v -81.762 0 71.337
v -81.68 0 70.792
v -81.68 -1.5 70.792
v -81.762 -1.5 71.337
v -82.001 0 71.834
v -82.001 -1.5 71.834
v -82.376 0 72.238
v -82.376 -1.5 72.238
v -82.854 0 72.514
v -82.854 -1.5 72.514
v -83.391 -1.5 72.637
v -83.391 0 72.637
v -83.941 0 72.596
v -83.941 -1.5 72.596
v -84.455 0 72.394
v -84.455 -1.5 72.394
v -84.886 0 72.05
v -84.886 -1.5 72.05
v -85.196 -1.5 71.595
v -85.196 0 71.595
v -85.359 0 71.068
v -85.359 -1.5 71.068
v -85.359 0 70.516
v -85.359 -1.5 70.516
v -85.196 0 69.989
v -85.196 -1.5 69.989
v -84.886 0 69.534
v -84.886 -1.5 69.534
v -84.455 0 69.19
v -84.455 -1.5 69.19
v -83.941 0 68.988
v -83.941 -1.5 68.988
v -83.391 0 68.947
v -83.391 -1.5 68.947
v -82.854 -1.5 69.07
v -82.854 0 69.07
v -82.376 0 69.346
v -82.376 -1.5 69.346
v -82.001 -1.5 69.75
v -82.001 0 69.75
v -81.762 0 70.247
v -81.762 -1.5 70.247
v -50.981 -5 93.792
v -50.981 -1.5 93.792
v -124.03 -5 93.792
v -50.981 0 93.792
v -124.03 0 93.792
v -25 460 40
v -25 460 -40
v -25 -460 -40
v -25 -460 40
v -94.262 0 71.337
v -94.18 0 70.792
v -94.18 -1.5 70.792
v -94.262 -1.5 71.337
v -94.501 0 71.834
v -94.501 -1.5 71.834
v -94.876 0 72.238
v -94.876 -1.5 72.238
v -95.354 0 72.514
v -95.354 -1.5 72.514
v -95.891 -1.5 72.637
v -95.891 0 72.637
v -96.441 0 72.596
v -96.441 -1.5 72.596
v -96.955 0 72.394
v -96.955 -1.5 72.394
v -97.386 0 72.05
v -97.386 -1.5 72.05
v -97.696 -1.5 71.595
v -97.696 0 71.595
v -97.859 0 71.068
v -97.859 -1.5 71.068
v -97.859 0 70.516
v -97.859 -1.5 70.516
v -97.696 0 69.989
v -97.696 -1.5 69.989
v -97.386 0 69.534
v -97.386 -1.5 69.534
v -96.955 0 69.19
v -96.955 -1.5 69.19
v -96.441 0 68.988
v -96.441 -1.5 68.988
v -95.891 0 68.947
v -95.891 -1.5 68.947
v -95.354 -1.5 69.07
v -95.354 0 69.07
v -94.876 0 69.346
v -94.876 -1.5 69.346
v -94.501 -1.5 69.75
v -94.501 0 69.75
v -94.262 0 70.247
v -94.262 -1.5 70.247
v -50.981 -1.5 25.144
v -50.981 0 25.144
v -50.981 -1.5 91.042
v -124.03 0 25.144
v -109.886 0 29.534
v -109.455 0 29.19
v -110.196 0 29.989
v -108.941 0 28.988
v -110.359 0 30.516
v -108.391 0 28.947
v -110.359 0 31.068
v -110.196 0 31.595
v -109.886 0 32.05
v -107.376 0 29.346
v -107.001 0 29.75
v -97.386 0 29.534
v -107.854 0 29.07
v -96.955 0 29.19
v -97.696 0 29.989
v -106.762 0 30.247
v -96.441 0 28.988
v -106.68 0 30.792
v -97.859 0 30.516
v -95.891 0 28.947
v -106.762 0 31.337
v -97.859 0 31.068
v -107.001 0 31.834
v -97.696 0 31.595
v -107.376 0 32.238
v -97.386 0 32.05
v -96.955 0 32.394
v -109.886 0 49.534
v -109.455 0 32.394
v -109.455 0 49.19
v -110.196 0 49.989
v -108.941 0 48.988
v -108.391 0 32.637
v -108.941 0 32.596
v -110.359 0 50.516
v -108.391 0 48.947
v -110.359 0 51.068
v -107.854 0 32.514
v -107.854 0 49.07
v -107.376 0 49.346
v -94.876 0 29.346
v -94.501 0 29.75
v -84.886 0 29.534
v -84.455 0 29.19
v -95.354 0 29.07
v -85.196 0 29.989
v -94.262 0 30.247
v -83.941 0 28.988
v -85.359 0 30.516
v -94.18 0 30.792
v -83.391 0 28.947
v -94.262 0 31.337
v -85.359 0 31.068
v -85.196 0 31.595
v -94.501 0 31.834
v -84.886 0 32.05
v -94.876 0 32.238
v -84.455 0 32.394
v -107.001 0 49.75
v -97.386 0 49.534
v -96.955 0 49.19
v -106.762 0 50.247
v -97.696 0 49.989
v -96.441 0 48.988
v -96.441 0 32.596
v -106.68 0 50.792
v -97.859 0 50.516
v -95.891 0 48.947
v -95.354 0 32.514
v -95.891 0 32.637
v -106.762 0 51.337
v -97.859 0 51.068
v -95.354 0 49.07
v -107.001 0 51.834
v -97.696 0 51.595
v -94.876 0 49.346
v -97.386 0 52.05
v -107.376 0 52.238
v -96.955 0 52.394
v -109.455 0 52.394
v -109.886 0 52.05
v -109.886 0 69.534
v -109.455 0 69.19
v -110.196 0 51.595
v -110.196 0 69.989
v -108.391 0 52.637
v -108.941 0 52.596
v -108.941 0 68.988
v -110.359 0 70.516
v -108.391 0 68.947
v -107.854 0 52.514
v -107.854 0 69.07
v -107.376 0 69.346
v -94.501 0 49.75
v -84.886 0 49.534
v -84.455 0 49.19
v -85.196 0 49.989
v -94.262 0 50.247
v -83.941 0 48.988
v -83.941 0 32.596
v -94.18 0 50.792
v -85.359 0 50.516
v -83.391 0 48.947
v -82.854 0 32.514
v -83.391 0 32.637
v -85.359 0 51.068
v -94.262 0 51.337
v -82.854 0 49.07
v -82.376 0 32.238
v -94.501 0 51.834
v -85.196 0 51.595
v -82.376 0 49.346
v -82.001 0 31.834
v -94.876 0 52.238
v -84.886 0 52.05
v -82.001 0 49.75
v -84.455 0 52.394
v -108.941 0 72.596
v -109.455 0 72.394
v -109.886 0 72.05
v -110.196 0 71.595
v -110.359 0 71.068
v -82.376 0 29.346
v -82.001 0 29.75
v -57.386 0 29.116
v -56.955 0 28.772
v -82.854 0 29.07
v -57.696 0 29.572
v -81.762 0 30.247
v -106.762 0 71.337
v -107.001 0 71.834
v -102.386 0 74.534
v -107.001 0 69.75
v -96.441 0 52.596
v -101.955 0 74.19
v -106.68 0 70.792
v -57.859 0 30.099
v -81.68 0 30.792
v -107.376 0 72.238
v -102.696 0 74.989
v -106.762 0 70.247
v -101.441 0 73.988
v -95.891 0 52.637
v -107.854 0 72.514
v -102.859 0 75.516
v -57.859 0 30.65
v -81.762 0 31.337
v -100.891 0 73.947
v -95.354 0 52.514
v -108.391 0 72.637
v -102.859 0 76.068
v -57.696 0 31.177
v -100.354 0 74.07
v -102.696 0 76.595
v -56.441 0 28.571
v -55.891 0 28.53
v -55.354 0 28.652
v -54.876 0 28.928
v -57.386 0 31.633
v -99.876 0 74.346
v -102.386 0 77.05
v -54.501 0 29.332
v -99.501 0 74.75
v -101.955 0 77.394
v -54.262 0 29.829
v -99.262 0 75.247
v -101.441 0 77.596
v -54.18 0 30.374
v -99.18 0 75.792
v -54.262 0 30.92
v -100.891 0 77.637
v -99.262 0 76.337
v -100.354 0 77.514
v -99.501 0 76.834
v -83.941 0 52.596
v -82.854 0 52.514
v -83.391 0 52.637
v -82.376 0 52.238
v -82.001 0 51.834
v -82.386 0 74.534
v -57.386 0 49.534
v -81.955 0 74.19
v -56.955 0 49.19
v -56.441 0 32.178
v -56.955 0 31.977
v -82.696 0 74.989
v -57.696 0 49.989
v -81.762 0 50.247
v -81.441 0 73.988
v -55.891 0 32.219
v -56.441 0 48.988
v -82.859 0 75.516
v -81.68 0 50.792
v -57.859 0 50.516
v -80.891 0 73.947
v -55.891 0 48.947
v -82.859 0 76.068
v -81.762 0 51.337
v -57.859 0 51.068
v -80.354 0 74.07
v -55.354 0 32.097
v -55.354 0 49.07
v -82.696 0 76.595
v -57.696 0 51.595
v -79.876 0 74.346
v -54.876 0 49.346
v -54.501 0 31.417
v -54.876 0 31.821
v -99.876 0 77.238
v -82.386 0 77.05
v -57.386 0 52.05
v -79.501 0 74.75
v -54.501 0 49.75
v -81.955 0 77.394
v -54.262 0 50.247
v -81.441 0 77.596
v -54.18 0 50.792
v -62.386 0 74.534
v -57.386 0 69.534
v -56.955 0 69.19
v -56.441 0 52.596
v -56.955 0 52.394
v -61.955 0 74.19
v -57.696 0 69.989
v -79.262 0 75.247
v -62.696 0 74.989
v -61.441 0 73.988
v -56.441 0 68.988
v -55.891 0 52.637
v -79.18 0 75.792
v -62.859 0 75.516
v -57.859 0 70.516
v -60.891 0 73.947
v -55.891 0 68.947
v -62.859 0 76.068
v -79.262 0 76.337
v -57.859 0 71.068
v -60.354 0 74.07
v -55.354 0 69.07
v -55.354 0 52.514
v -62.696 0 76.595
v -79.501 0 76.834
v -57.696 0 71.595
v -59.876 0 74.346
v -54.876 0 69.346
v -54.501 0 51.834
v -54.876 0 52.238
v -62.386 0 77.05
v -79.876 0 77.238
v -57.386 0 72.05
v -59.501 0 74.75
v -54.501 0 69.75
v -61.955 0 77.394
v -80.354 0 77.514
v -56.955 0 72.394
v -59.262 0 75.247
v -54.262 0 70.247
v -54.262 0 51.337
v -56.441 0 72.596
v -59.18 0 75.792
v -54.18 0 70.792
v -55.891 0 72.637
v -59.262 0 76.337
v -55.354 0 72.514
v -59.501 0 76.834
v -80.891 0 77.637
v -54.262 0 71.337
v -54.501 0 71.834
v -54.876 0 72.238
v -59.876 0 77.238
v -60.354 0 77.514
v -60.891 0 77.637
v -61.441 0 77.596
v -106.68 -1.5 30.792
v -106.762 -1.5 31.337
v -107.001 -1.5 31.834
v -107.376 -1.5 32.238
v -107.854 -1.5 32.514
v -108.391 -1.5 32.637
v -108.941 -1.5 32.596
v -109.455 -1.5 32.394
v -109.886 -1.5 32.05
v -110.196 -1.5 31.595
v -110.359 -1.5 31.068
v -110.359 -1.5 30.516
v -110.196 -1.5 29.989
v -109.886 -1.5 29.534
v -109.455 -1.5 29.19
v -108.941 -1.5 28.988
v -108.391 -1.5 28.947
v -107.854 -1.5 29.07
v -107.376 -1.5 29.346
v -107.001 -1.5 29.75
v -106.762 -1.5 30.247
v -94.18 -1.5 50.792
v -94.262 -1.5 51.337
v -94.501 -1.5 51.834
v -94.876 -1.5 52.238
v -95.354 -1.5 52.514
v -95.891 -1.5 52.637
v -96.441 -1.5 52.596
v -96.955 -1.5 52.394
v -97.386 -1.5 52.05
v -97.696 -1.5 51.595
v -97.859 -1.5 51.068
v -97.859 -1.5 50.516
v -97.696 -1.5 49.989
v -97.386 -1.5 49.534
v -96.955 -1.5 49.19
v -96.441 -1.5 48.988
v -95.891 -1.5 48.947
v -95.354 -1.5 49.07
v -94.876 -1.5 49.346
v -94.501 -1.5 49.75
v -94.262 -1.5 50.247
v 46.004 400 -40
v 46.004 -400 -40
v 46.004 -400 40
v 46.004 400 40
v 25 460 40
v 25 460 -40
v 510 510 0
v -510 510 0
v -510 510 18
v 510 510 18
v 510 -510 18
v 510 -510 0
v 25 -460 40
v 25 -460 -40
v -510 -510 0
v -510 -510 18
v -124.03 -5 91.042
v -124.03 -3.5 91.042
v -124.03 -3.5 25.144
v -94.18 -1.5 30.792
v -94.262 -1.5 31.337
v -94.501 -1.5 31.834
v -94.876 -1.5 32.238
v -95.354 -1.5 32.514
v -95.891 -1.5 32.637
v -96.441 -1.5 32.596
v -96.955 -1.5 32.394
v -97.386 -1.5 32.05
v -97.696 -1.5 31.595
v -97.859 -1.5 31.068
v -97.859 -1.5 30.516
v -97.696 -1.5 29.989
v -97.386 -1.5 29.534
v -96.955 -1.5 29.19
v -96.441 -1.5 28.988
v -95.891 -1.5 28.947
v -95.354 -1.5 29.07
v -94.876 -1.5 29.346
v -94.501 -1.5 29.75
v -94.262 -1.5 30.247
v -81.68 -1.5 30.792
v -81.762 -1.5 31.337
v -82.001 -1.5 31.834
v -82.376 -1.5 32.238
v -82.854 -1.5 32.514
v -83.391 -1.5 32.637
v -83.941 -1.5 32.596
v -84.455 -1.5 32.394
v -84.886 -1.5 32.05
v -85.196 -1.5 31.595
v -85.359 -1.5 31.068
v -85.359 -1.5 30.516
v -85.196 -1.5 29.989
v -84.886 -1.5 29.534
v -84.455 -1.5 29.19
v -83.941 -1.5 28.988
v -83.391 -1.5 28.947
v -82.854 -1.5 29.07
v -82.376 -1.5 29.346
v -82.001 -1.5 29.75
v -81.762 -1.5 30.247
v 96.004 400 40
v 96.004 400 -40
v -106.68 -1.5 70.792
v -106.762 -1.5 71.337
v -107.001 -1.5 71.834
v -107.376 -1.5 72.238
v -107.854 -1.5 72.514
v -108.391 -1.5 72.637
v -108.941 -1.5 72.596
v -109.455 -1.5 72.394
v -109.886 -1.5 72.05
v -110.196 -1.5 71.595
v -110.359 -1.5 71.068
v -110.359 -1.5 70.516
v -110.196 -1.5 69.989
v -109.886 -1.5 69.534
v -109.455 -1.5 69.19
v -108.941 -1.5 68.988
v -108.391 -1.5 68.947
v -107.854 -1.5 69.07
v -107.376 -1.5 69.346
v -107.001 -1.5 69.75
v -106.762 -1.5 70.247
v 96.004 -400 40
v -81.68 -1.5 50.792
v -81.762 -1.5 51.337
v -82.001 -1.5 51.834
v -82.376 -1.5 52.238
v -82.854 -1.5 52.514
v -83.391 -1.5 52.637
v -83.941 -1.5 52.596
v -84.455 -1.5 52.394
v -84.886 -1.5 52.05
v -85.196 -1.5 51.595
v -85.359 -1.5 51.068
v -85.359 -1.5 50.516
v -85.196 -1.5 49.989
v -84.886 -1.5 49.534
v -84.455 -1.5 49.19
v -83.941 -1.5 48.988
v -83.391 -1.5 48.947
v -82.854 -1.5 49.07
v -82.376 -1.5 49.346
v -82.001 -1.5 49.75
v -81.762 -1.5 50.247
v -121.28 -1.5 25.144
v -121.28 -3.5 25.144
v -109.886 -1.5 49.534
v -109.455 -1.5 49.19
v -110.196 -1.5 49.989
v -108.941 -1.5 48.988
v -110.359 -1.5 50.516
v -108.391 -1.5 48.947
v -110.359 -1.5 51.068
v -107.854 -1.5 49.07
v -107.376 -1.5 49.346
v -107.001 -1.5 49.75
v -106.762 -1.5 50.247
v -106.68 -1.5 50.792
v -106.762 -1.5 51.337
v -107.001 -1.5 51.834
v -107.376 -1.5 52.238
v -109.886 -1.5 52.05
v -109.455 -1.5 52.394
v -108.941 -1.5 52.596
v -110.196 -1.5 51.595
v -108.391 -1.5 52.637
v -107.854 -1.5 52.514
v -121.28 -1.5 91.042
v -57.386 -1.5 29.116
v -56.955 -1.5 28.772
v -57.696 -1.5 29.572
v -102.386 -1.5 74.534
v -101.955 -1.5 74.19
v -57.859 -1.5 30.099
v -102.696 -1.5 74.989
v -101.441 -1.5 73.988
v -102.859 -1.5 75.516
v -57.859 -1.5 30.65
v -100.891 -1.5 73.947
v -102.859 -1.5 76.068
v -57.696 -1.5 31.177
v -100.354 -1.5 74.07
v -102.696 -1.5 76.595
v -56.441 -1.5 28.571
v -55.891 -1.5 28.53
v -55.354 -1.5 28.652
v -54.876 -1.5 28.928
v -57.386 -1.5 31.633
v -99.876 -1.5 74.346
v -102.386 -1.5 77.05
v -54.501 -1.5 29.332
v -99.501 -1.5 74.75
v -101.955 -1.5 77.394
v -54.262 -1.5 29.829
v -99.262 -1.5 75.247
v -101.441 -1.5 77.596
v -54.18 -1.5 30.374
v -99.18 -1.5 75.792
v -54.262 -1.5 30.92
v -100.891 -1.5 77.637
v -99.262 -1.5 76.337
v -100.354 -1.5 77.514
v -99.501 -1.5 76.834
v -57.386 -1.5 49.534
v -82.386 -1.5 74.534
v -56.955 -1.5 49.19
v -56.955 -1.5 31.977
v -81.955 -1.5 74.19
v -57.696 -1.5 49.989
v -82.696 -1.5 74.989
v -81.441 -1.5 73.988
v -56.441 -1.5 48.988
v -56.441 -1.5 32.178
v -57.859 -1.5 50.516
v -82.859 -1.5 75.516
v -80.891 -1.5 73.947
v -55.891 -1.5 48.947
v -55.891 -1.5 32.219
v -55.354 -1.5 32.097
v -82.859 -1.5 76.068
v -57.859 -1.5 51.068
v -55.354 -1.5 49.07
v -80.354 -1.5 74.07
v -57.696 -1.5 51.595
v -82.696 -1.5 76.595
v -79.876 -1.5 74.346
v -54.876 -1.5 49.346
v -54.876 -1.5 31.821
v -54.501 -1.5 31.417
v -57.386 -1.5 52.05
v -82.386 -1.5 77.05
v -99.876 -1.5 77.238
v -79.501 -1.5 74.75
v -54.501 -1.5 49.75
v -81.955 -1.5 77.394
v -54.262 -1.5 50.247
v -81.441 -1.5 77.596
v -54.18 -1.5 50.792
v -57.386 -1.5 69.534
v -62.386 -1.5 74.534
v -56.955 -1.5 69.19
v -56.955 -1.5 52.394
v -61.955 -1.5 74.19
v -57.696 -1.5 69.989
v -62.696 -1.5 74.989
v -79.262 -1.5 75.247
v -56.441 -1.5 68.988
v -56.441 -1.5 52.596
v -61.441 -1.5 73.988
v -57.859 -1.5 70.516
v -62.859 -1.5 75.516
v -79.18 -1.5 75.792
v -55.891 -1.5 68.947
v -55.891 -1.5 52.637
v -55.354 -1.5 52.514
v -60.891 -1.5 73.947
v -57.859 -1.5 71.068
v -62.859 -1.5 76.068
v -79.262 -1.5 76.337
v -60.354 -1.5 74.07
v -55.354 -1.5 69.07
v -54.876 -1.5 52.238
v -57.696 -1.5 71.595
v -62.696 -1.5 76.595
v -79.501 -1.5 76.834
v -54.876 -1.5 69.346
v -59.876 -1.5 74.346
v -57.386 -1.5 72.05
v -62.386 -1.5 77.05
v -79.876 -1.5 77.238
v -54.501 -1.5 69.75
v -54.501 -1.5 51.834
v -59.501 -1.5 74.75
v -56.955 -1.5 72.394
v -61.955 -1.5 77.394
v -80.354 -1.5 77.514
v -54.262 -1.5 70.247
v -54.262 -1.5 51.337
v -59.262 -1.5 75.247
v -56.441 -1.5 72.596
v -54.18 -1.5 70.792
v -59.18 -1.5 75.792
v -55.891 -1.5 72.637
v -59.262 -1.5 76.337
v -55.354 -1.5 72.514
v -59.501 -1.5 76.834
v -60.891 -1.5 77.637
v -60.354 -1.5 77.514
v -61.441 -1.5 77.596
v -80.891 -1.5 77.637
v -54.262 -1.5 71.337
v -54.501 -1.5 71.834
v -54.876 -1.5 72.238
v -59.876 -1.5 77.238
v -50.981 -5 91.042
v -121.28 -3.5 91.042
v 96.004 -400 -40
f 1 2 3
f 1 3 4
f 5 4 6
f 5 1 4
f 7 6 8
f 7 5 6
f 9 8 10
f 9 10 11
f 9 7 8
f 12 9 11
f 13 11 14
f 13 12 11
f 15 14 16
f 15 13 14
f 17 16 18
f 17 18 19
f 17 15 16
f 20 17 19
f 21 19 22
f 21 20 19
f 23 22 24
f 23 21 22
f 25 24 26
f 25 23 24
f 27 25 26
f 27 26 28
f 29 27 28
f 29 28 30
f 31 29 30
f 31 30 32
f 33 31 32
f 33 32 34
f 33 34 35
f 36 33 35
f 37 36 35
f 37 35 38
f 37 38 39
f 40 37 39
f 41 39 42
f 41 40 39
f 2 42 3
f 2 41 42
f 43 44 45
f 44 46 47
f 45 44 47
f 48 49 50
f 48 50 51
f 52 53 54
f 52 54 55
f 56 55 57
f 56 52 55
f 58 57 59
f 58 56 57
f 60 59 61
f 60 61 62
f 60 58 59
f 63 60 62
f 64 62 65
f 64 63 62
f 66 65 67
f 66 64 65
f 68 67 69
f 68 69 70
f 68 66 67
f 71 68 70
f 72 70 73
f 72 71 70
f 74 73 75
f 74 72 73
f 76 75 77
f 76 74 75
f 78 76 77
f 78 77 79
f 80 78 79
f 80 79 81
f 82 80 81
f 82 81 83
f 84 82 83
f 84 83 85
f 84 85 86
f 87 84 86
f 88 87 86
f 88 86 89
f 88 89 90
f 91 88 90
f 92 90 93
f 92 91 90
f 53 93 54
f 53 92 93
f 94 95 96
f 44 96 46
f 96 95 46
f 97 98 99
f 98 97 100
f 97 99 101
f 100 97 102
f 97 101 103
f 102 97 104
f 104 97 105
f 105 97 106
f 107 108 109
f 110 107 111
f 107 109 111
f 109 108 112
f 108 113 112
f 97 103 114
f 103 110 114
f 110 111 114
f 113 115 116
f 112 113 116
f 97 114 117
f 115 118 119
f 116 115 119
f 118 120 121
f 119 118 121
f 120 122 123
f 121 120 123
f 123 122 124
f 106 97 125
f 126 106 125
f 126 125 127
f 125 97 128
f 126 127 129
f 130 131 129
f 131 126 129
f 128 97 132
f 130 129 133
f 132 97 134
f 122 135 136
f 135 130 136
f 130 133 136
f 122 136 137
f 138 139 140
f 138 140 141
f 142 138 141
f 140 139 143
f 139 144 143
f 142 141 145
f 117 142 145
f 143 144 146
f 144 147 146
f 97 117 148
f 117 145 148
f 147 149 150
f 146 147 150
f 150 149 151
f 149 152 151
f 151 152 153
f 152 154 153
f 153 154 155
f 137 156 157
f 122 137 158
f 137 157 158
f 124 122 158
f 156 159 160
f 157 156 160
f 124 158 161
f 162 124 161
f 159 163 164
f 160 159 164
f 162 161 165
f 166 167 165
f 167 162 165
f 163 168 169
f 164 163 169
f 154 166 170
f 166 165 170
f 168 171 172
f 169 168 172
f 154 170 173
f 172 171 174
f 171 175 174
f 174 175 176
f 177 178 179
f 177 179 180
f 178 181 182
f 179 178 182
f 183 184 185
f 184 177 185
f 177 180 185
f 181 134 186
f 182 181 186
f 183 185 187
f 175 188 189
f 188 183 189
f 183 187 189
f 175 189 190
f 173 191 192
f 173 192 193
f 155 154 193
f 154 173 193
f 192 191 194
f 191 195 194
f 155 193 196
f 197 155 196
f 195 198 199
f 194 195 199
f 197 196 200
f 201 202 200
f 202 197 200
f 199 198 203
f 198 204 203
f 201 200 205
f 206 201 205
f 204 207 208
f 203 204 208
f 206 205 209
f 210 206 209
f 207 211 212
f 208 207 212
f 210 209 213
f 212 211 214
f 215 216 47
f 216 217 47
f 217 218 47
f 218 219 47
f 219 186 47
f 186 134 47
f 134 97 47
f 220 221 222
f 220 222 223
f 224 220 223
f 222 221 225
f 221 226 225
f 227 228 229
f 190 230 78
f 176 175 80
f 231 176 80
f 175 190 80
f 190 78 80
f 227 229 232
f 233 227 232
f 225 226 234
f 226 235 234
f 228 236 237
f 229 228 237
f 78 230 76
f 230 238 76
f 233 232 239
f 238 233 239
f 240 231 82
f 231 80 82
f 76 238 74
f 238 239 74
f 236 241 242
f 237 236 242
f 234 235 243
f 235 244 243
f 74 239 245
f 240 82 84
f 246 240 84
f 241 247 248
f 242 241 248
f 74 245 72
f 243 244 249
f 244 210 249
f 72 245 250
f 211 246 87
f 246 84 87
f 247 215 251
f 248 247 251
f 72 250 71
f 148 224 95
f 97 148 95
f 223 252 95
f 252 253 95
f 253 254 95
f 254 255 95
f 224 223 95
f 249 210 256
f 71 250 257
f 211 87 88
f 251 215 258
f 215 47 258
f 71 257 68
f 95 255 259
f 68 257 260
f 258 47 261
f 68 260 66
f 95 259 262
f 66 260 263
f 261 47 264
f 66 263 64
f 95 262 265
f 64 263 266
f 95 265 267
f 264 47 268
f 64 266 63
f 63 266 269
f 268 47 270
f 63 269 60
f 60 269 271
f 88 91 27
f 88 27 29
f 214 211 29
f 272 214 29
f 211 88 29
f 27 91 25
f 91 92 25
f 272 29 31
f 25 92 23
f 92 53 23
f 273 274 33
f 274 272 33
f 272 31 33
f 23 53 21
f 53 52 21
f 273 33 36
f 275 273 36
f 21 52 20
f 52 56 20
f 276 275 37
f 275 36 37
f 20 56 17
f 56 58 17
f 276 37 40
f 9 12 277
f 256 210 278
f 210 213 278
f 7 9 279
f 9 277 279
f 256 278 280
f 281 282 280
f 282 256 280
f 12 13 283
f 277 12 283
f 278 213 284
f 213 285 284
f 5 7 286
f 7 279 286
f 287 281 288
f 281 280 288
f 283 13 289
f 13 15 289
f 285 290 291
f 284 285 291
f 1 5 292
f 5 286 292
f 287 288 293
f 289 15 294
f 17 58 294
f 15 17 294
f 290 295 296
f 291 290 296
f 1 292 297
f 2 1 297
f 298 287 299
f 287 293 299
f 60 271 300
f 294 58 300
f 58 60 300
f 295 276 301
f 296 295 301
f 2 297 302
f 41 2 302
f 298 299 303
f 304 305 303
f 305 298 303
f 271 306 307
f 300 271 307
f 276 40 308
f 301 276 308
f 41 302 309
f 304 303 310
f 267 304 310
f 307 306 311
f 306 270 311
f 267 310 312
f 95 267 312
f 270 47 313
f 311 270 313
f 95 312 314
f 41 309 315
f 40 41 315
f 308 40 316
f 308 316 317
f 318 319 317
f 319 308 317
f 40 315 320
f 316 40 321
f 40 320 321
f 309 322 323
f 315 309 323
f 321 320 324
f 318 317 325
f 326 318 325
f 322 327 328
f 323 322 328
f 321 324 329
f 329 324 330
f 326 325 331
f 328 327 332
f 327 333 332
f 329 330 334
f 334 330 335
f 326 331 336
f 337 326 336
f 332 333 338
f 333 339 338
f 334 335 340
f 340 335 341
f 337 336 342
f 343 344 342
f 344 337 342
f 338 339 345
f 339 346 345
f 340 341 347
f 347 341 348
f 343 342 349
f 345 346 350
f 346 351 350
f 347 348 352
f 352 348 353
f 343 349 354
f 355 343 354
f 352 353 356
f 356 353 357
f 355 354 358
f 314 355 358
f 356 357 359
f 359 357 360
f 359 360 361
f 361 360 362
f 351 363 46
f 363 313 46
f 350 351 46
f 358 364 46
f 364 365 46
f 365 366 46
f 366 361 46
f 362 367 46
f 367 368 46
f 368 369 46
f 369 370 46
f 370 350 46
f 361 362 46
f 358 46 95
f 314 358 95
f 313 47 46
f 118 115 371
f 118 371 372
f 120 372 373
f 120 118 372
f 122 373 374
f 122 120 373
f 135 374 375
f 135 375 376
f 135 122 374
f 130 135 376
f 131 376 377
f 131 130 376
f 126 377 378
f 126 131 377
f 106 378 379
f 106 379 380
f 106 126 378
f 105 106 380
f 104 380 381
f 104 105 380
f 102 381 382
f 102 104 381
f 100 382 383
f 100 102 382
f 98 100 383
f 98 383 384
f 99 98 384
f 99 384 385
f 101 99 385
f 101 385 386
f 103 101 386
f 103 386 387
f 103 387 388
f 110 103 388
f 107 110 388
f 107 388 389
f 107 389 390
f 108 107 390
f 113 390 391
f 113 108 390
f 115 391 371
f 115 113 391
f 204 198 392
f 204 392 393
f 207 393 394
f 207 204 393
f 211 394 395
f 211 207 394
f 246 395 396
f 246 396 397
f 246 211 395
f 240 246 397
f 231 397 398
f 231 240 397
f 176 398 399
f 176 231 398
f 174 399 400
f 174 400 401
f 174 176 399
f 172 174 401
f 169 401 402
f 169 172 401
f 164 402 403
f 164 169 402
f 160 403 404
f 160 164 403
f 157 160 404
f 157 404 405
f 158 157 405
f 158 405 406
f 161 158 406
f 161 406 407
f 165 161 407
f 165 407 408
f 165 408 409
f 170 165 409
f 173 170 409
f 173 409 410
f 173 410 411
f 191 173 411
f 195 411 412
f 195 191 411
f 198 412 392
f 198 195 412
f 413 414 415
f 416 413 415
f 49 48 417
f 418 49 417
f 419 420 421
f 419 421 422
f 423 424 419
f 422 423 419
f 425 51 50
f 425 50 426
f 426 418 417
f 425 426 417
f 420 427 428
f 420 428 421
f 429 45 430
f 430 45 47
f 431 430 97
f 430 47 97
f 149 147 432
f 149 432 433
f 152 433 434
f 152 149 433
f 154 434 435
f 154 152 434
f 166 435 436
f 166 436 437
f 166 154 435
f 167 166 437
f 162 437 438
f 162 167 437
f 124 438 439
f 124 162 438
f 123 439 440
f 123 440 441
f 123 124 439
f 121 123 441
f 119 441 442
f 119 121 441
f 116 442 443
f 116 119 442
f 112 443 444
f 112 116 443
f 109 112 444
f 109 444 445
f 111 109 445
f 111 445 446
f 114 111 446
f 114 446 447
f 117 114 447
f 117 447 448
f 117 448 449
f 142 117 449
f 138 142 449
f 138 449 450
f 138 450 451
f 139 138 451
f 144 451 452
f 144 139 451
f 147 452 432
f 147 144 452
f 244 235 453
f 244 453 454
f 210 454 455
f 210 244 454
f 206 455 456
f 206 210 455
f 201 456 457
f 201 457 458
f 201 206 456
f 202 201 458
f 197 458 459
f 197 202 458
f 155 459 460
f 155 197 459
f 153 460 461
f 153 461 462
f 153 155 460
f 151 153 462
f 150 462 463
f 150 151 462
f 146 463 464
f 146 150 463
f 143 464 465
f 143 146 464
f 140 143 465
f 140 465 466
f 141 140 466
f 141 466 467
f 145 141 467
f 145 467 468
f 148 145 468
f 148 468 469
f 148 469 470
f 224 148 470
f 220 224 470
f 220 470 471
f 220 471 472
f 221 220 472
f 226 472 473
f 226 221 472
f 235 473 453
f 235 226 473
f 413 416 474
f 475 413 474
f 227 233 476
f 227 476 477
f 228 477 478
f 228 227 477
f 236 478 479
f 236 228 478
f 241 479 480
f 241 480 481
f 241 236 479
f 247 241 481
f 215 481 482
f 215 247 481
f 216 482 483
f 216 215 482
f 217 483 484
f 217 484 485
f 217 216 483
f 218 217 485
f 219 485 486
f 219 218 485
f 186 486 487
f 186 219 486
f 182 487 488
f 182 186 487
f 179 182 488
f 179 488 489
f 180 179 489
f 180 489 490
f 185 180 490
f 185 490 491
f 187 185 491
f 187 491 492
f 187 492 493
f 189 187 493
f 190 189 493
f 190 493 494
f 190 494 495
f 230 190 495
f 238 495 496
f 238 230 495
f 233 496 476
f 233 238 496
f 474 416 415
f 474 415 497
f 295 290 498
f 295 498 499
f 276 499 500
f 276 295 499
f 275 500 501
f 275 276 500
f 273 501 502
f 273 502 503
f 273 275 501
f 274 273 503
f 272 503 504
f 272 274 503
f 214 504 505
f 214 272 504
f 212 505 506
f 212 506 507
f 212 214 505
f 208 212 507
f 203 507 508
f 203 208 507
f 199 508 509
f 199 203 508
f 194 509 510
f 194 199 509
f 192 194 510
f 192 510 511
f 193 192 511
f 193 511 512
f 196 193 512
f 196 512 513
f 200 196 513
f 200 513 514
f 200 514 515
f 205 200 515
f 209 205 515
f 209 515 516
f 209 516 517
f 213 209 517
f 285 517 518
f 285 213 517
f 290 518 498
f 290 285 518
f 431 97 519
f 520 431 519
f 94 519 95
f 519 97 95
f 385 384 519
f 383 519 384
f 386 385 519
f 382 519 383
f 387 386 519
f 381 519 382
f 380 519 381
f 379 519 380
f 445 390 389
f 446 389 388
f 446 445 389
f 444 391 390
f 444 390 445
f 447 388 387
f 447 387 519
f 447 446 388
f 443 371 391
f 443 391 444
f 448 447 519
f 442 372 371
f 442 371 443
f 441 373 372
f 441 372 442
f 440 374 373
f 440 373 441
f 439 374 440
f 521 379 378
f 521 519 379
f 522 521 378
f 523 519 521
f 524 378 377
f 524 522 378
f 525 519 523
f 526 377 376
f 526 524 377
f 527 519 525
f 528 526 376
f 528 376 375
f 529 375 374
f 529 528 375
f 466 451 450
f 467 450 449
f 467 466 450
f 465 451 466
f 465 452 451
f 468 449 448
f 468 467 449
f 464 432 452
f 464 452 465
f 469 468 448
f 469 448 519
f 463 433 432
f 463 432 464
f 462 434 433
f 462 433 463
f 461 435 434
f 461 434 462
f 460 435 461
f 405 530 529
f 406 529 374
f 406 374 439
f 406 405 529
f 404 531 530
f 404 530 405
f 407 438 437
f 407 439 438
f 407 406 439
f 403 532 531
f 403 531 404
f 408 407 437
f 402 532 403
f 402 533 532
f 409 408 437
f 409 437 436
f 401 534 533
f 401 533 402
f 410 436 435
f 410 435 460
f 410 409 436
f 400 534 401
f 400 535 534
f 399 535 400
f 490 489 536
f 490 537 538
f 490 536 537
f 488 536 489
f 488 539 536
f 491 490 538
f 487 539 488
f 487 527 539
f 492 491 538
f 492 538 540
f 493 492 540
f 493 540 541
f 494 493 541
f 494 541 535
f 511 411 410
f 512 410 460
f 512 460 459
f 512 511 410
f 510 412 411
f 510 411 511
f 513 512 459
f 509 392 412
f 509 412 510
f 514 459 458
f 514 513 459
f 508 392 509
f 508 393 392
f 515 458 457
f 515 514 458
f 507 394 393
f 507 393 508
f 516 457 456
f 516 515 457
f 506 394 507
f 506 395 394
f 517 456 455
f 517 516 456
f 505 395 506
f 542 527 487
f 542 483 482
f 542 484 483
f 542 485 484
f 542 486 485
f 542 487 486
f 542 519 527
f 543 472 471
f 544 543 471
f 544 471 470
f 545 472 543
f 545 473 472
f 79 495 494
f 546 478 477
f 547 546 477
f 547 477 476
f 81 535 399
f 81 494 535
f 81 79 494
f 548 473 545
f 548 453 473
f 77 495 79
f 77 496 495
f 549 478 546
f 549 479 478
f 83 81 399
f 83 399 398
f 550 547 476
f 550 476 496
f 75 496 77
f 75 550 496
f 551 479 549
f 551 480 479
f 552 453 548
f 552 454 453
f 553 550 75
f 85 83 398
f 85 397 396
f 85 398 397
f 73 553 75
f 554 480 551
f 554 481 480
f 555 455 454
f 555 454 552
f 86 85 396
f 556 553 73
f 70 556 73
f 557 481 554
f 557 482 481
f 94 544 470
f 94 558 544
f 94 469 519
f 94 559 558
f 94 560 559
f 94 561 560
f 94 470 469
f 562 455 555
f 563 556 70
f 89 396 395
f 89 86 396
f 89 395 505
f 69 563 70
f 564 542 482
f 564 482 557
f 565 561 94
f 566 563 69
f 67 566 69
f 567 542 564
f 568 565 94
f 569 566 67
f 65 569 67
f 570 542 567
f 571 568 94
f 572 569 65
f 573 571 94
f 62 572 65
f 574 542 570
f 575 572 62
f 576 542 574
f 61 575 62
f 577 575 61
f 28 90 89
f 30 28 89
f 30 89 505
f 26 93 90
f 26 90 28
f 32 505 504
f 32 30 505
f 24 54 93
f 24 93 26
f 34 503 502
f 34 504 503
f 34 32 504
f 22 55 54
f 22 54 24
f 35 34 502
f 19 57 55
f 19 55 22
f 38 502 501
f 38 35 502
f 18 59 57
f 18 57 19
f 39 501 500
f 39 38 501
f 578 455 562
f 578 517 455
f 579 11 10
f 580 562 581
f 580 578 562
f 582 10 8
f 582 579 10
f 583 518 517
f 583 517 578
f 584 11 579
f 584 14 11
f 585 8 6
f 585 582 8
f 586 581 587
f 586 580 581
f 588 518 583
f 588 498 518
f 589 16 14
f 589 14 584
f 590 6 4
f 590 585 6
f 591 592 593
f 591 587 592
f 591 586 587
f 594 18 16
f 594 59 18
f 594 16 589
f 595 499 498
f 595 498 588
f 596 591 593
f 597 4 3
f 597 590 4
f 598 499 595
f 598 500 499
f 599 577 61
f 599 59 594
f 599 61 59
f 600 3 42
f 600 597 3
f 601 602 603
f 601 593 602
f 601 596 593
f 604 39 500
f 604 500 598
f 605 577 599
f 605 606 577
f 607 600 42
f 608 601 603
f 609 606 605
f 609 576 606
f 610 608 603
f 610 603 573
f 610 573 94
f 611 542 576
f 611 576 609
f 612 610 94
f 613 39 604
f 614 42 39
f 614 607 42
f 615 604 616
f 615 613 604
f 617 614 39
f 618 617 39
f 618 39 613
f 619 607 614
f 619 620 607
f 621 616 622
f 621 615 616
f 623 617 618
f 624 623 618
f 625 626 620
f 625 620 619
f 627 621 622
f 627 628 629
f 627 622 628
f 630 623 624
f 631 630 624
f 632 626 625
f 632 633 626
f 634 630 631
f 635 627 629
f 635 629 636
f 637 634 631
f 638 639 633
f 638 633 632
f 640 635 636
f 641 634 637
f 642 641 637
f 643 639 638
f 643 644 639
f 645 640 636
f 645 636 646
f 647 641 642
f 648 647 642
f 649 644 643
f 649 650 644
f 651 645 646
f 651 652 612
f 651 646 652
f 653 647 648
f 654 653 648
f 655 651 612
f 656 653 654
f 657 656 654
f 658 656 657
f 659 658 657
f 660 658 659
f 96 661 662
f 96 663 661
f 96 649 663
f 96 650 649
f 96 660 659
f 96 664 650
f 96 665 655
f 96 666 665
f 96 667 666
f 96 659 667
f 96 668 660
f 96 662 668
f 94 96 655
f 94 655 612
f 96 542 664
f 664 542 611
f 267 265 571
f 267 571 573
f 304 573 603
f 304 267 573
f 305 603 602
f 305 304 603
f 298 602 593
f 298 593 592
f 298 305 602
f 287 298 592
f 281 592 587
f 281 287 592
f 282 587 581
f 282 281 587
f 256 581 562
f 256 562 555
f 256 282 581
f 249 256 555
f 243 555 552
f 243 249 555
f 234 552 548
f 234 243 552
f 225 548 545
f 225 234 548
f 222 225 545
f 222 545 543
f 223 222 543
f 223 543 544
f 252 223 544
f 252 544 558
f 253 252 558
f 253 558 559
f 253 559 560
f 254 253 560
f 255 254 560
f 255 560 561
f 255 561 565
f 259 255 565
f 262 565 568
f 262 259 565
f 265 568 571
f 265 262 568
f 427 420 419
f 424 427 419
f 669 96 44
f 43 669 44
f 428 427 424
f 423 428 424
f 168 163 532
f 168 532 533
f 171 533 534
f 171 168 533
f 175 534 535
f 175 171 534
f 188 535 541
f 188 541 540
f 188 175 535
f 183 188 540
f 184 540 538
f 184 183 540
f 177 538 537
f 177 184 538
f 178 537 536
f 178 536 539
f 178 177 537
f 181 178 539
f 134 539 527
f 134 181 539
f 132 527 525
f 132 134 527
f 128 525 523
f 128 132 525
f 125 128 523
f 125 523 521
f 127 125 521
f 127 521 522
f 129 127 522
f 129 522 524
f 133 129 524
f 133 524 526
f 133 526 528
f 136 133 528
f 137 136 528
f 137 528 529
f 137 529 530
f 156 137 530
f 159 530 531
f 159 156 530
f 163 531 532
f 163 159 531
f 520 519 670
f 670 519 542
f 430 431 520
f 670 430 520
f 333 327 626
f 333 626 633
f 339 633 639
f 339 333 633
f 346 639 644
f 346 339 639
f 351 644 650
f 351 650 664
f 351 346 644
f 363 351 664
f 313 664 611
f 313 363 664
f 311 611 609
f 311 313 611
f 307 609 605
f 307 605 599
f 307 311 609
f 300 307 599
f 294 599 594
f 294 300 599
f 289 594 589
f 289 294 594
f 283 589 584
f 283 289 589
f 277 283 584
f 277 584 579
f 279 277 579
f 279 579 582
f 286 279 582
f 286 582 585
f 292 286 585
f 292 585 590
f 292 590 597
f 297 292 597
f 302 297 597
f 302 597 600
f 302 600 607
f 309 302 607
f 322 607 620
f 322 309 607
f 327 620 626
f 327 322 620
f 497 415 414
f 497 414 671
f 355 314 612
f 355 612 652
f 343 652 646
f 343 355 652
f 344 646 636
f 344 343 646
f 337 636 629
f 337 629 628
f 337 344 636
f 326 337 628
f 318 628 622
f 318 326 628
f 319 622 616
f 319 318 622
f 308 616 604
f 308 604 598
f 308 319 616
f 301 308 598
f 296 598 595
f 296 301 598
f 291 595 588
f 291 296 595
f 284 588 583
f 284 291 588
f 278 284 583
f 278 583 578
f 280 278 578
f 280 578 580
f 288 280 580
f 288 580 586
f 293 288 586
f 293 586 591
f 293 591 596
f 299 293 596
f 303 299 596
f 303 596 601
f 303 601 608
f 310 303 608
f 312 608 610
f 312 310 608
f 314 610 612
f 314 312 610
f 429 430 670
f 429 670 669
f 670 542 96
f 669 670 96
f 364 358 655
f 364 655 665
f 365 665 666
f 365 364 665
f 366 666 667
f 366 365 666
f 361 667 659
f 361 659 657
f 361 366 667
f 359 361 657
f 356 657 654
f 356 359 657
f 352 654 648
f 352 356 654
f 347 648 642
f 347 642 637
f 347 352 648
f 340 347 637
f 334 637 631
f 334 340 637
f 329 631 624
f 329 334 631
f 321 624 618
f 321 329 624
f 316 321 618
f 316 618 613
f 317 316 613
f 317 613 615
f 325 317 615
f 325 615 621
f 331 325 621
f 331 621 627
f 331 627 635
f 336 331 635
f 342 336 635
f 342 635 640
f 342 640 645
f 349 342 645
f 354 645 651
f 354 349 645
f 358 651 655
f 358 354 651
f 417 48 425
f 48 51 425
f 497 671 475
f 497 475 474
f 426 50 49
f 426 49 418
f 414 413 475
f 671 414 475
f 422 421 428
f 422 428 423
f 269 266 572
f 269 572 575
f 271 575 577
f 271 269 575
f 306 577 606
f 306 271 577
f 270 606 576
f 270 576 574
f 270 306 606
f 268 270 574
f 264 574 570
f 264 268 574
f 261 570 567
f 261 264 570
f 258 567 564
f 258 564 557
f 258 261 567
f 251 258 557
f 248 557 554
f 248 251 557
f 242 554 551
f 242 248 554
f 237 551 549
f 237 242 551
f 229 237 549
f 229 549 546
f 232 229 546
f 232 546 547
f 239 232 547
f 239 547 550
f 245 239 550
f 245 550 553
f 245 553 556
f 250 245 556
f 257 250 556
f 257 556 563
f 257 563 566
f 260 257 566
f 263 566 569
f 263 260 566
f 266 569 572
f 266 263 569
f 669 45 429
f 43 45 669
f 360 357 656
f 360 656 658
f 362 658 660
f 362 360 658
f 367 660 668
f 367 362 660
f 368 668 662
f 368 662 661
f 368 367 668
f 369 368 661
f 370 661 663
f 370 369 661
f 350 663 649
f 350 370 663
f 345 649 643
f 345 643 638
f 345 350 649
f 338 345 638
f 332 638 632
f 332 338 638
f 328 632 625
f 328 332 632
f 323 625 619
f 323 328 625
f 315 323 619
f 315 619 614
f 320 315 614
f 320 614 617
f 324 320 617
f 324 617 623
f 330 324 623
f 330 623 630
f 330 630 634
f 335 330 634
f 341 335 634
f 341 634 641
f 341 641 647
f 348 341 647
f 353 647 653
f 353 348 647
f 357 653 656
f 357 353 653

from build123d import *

# Parameters (mm, degrees)
F0_W     = 50
F0_H     = 80
F1_DEPTH = 460
F2_DEPTH = 400
F3_R     = 1.85
F3_W     = 2.75
F3_H     = 65.8975437433
F3_W_2   = 20.0489750504
F3_H_2   = 2.75
F4_DEPTH = 1.5
F5_DEPTH = 5
F6_DEPTH = 3.5
F7_W     = 1020
F7_H     = 1020
F8_DEPTH = 18


with BuildPart() as f1:
    # F0 (on Front) → F1 (new body, symmetric)
    with BuildSketch(Plane.XZ):
        Rectangle(F0_W, F0_H)
    extrude(amount=F1_DEPTH, both=True)


with BuildPart() as f2:
    # F0 (on Front) → F2 (new body, symmetric)
    with BuildSketch(Plane.XZ):
        with Locations((71.0044652224, 0)):
            Rectangle(F0_W, F0_H)
    extrude(amount=F2_DEPTH, both=True)


with BuildPart() as f4:
    # F3 (on Front) → F4 (new body)
    with BuildSketch(Plane.XZ):
        Polygon((-121.2795429826, 25.1443590969), (-71.0295429826, 25.1443590969), (-71.0295429826, 90.7919028401), (-71.0295429826, 91.0419028401), (-121.2795429826, 91.0419028401), align=None)
        with Locations((-108.5295429826, 30.7919028401)):
            Circle(F3_R, mode=Mode.SUBTRACT)
        with Locations((-96.0295429826, 30.7919028401)):
            Circle(F3_R, mode=Mode.SUBTRACT)
        with Locations((-108.5295429826, 50.7919028401)):
            Circle(F3_R, mode=Mode.SUBTRACT)
        with Locations((-96.0295429826, 50.7919028401)):
            Circle(F3_R, mode=Mode.SUBTRACT)
        with Locations((-83.5295429826, 30.7919028401)):
            Circle(F3_R, mode=Mode.SUBTRACT)
        with Locations((-83.5295429826, 50.7919028401)):
            Circle(F3_R, mode=Mode.SUBTRACT)
        with Locations((-108.5295429826, 70.7919028401)):
            Circle(F3_R, mode=Mode.SUBTRACT)
        with Locations((-101.0295429826, 75.7919028401)):
            Circle(F3_R, mode=Mode.SUBTRACT)
        with Locations((-96.0295429826, 70.7919028401)):
            Circle(F3_R, mode=Mode.SUBTRACT)
        with Locations((-83.5295429826, 70.7919028401)):
            Circle(F3_R, mode=Mode.SUBTRACT)
        with Locations((-81.0295429826, 75.7919028401)):
            Circle(F3_R, mode=Mode.SUBTRACT)
        Polygon((-71.0295429826, 90.7919028401), (-71.0295429826, 25.1443590969), (-50.9805679321, 25.1443590969), (-50.9805679321, 91.0419028401), (-71.0295429826, 91.0419028401), align=None)
        with Locations((-56.0295429826, 30.3744599223)):
            Circle(F3_R, mode=Mode.SUBTRACT)
        with Locations((-56.0295429826, 50.7919028401)):
            Circle(F3_R, mode=Mode.SUBTRACT)
        with Locations((-61.0295429826, 75.7919028401)):
            Circle(F3_R, mode=Mode.SUBTRACT)
        with Locations((-56.0295429826, 70.7919028401)):
            Circle(F3_R, mode=Mode.SUBTRACT)
        with Locations((-122.6545429826, 58.0931309685)):
            Rectangle(F3_W, F3_H)
        Polygon((-121.2795429826, 91.0419028401), (-71.0295429826, 91.0419028401), (-71.0295429826, 93.7919028401), (-124.0295429826, 93.7919028401), (-124.0295429826, 91.0419028401), align=None)
        with Locations((-61.0050554574, 92.4169028401)):
            Rectangle(F3_W_2, F3_H_2)
    extrude(amount=F4_DEPTH)

    # F3 (on Front) → F5 (join)
    with BuildSketch(Plane.XZ):
        Polygon((-121.2795429826, 91.0419028401), (-71.0295429826, 91.0419028401), (-71.0295429826, 93.7919028401), (-124.0295429826, 93.7919028401), (-124.0295429826, 91.0419028401), align=None)
        with Locations((-61.0050554574, 92.4169028401)):
            Rectangle(F3_W_2, F3_H_2)
    extrude(amount=F5_DEPTH)

    # F3 (on Front) → F6 (join)
    with BuildSketch(Plane.XZ):
        with Locations((-122.6545429826, 58.0931309685)):
            Rectangle(F3_W, F3_H)
    extrude(amount=F6_DEPTH)


with BuildPart() as f8:
    # F7 (on Top) → F8 (new body)
    with BuildSketch(Plane.XY):
        Rectangle(F7_W, F7_H)
    extrude(amount=F8_DEPTH)


solid = Compound([f1.part, f2.part, f4.part, f8.part])
